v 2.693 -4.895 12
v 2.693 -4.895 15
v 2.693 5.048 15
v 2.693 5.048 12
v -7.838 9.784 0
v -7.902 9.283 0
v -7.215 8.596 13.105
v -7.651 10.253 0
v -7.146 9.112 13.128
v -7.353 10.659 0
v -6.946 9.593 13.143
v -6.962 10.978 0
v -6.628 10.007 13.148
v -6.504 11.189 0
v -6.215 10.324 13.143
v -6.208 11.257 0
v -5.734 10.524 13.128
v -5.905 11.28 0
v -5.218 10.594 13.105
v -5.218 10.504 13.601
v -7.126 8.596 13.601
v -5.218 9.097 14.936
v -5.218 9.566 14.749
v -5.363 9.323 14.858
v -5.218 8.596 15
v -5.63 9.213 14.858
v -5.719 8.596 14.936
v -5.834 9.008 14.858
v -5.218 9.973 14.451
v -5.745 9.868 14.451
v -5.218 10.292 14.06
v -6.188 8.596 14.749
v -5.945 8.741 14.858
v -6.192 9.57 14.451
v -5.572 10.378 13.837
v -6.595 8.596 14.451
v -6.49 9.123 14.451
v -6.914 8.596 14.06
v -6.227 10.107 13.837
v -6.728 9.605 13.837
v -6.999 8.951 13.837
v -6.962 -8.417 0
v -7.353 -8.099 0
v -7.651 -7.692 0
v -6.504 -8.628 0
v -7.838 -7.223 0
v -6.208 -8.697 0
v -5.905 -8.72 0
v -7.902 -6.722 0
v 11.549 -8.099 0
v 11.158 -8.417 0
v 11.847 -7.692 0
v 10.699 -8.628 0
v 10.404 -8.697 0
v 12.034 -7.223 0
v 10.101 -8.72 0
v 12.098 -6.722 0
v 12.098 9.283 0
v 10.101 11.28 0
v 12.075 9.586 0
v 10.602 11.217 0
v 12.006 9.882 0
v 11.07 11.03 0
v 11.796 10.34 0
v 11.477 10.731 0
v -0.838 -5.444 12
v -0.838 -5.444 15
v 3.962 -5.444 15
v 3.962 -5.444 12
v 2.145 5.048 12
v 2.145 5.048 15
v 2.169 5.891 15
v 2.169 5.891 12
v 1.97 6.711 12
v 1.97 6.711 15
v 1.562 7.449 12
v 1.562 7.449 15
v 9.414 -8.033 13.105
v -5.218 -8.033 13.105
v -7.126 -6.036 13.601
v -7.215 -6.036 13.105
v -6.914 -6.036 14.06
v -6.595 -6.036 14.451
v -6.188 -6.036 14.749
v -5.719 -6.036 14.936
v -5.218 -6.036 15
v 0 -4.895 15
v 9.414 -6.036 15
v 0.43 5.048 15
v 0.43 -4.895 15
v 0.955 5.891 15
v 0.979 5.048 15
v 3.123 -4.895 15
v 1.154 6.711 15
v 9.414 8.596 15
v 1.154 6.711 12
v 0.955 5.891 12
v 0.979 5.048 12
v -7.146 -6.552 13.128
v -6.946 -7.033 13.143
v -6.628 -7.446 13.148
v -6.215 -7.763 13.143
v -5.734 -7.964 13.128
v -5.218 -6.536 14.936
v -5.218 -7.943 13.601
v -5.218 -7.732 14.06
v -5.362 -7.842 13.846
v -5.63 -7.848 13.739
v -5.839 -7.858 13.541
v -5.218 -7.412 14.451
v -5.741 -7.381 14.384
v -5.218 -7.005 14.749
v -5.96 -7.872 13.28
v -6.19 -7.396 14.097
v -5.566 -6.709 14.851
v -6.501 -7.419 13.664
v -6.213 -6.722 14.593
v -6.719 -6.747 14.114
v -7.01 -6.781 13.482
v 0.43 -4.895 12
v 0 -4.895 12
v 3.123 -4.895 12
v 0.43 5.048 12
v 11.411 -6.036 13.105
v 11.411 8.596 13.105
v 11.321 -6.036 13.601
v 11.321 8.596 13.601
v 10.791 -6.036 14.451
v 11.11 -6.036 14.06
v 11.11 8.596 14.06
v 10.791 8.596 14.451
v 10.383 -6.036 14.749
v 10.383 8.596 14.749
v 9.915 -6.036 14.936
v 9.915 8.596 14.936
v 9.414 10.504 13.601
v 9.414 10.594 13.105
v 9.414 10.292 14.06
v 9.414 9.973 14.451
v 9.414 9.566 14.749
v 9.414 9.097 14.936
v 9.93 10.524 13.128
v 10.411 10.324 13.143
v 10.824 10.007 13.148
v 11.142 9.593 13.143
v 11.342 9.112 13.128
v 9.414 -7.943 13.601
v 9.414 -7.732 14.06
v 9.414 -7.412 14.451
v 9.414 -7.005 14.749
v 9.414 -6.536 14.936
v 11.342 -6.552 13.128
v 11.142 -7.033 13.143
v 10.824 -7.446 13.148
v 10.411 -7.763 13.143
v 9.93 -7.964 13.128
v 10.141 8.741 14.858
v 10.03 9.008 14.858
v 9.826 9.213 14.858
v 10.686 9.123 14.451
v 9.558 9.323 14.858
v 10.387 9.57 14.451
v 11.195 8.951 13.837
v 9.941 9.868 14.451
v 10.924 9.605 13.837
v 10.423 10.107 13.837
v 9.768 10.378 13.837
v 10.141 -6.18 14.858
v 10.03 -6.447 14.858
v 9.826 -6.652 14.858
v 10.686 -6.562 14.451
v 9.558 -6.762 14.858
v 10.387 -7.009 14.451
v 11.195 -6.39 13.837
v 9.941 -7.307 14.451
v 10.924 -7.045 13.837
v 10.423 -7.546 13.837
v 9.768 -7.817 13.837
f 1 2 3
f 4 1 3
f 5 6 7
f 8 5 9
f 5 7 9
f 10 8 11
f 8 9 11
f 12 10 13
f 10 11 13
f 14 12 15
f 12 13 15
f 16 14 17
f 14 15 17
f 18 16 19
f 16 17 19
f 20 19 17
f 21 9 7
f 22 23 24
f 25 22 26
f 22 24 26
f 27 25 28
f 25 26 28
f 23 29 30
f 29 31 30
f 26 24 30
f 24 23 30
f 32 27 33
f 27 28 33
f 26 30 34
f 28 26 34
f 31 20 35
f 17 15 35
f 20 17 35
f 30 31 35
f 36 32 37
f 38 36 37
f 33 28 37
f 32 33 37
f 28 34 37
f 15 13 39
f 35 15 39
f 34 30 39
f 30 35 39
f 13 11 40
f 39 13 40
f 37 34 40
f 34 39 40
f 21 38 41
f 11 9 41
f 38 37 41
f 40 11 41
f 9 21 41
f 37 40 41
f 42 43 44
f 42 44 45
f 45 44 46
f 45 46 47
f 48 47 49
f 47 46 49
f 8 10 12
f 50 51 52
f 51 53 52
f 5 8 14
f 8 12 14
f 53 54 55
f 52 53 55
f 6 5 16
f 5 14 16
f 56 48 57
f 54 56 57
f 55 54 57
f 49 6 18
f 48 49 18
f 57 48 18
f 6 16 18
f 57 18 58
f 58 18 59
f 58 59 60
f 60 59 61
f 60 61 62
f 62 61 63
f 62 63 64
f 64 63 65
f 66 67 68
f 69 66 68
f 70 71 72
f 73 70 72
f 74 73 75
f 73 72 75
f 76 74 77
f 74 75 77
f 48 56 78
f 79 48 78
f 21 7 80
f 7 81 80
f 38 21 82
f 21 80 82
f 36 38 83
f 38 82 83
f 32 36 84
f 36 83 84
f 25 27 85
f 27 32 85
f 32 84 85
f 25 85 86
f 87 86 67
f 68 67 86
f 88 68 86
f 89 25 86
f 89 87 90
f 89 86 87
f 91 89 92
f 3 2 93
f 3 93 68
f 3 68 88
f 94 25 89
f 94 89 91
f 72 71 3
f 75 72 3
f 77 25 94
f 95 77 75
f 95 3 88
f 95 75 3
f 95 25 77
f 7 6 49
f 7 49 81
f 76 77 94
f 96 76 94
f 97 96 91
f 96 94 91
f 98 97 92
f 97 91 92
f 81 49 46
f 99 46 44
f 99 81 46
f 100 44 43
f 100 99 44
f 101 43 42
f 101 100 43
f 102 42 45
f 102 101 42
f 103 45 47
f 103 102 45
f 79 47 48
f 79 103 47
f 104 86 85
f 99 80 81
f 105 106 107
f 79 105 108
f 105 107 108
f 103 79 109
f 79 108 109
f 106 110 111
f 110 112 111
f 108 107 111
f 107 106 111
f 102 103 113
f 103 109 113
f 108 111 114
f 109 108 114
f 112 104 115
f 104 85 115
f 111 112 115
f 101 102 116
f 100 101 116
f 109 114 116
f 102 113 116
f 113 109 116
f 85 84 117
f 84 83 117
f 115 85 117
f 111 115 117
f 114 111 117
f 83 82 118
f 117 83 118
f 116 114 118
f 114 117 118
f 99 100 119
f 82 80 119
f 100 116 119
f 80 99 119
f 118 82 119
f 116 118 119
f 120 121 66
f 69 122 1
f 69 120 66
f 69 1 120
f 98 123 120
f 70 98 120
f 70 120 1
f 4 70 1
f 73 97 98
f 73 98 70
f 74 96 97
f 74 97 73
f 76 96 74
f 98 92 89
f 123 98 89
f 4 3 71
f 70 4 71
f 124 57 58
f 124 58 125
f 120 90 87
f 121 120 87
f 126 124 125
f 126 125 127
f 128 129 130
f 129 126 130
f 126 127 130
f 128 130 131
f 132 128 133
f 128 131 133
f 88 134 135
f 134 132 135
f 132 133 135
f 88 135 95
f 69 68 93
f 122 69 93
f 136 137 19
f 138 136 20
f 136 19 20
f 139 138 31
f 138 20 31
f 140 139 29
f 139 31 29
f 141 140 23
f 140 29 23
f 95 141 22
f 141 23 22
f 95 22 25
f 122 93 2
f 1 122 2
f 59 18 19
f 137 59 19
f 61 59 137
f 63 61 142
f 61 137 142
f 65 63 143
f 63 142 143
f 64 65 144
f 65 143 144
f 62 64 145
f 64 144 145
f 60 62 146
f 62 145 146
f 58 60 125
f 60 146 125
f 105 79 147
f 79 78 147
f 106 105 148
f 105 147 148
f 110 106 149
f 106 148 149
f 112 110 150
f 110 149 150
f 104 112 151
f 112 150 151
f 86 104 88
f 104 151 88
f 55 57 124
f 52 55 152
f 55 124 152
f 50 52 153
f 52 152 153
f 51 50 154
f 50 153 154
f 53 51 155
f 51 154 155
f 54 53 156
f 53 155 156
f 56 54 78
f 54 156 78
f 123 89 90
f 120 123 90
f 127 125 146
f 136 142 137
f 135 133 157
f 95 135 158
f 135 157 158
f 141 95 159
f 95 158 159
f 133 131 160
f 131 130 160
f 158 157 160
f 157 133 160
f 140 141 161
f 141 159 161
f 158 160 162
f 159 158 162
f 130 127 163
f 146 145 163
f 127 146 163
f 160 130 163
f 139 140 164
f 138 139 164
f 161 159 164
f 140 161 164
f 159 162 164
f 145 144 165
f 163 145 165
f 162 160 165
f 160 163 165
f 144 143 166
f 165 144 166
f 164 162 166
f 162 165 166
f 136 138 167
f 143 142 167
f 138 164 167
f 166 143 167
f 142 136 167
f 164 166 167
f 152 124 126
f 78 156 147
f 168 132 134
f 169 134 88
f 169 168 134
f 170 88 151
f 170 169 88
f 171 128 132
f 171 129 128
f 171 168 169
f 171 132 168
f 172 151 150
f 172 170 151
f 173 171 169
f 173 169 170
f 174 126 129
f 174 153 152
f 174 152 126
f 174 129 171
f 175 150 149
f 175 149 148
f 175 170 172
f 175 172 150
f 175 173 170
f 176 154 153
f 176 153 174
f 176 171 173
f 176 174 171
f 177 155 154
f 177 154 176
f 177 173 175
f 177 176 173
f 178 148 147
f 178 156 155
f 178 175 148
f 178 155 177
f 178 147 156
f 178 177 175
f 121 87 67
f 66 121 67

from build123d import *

# Parameters (mm, degrees)
F0_W     = 20
F0_H     = 20
F1_DEPTH = 15
F1_TAPER = 3
F2_R     = 2
F4_W     = 20
F4_H     = 20
F5_DEPTH = 15
F5_TAPER = 3
F6_R     = 2
F9_DEPTH = 3


with BuildPart() as f1:
    # F0 (on Top) → F1 (new body)
    with BuildSketch(Plane.XY):
        with Locations((1.3560000807, 2.0036636425)):
            Rectangle(F0_W, F0_H)
    extrude(amount=F1_DEPTH, taper=F1_TAPER)

    # F2
    f2_edges = [f1.edges().sort_by_distance(p)[0] for p in [
        (1.356, 11.217547, 15),
        (10.962941, 11.610605, 7.500009),
        (-8.250942, 11.610605, 7.5),
        (10.569883, 2.003664, 15),
        (10.962942, -7.603278, 7.5),
        (-8.250942, -7.603278, 7.5),
        (-7.857883, 2.003664, 15),
        (1.356, -7.21022, 15),
    ]]
    fillet(f2_edges, radius=F2_R)


with BuildPart() as f5:
    # F4 (on Top) → F5 (new body)
    with BuildSketch(Plane.XY):
        with Locations((2.0978832617, 1.2803806274)):
            Rectangle(F4_W, F4_H)
    extrude(amount=F5_DEPTH, taper=F5_TAPER)

    # F6
    f6_edges = [f5.edges().sort_by_distance(p)[0] for p in [
        (-7.509058, 10.887322, 7.5),
        (11.704824, 10.887322, 7.500009),
        (11.704825, -8.326561, 7.5),
        (11.311767, 1.280381, 15),
        (2.097883, 10.494264, 15),
        (-7.116, 1.280381, 15),
        (2.097883, -7.933503, 15),
        (-7.509058, -8.326561, 7.5),
    ]]
    fillet(f6_edges, radius=F6_R)

    # F8 (on face) → F9 (cut)
    with BuildSketch(Plane.XY.offset(15)):
        with BuildLine():
            Line((-0.838498876, -5.4438896477), (1.5617019963, -5.4438896477))
            Line((1.5617019963, -5.4438896477), (3.9619028685, -5.4438896477))
            Line((3.9619028685, -5.4438896477), (3.1234039925, -4.8952721991))
            Line((3.1234039925, -4.8952721991), (2.6932252222, -4.8952721991))
            Line((2.6932252222, -4.8952721991), (2.6932252222, 5.0484170206))
            Line((2.6932252222, 5.0484170206), (2.1446079481, 5.0484170206))
            ThreePointArc((2.1446079481, 5.0484170206), (2.0965612153, 6.3076305978), (1.5617019963, 7.4486183003))
            ThreePointArc((1.5617019963, 7.4486183003), (1.0268427772, 6.3076305978), (0.9787960444, 5.0484170206))
            Line((0.9787960444, 5.0484170206), (0.4301787703, 5.0484170206))
            Line((0.4301787703, 5.0484170206), (0.4301787703, -4.8952721991))
            Line((0.4301787703, -4.8952721991), (0, -4.8952721991))
            Line((0, -4.8952721991), (-0.838498876, -5.4438896477))
        make_face()
    extrude(amount=-F9_DEPTH, mode=Mode.SUBTRACT)


solid = f5.part
